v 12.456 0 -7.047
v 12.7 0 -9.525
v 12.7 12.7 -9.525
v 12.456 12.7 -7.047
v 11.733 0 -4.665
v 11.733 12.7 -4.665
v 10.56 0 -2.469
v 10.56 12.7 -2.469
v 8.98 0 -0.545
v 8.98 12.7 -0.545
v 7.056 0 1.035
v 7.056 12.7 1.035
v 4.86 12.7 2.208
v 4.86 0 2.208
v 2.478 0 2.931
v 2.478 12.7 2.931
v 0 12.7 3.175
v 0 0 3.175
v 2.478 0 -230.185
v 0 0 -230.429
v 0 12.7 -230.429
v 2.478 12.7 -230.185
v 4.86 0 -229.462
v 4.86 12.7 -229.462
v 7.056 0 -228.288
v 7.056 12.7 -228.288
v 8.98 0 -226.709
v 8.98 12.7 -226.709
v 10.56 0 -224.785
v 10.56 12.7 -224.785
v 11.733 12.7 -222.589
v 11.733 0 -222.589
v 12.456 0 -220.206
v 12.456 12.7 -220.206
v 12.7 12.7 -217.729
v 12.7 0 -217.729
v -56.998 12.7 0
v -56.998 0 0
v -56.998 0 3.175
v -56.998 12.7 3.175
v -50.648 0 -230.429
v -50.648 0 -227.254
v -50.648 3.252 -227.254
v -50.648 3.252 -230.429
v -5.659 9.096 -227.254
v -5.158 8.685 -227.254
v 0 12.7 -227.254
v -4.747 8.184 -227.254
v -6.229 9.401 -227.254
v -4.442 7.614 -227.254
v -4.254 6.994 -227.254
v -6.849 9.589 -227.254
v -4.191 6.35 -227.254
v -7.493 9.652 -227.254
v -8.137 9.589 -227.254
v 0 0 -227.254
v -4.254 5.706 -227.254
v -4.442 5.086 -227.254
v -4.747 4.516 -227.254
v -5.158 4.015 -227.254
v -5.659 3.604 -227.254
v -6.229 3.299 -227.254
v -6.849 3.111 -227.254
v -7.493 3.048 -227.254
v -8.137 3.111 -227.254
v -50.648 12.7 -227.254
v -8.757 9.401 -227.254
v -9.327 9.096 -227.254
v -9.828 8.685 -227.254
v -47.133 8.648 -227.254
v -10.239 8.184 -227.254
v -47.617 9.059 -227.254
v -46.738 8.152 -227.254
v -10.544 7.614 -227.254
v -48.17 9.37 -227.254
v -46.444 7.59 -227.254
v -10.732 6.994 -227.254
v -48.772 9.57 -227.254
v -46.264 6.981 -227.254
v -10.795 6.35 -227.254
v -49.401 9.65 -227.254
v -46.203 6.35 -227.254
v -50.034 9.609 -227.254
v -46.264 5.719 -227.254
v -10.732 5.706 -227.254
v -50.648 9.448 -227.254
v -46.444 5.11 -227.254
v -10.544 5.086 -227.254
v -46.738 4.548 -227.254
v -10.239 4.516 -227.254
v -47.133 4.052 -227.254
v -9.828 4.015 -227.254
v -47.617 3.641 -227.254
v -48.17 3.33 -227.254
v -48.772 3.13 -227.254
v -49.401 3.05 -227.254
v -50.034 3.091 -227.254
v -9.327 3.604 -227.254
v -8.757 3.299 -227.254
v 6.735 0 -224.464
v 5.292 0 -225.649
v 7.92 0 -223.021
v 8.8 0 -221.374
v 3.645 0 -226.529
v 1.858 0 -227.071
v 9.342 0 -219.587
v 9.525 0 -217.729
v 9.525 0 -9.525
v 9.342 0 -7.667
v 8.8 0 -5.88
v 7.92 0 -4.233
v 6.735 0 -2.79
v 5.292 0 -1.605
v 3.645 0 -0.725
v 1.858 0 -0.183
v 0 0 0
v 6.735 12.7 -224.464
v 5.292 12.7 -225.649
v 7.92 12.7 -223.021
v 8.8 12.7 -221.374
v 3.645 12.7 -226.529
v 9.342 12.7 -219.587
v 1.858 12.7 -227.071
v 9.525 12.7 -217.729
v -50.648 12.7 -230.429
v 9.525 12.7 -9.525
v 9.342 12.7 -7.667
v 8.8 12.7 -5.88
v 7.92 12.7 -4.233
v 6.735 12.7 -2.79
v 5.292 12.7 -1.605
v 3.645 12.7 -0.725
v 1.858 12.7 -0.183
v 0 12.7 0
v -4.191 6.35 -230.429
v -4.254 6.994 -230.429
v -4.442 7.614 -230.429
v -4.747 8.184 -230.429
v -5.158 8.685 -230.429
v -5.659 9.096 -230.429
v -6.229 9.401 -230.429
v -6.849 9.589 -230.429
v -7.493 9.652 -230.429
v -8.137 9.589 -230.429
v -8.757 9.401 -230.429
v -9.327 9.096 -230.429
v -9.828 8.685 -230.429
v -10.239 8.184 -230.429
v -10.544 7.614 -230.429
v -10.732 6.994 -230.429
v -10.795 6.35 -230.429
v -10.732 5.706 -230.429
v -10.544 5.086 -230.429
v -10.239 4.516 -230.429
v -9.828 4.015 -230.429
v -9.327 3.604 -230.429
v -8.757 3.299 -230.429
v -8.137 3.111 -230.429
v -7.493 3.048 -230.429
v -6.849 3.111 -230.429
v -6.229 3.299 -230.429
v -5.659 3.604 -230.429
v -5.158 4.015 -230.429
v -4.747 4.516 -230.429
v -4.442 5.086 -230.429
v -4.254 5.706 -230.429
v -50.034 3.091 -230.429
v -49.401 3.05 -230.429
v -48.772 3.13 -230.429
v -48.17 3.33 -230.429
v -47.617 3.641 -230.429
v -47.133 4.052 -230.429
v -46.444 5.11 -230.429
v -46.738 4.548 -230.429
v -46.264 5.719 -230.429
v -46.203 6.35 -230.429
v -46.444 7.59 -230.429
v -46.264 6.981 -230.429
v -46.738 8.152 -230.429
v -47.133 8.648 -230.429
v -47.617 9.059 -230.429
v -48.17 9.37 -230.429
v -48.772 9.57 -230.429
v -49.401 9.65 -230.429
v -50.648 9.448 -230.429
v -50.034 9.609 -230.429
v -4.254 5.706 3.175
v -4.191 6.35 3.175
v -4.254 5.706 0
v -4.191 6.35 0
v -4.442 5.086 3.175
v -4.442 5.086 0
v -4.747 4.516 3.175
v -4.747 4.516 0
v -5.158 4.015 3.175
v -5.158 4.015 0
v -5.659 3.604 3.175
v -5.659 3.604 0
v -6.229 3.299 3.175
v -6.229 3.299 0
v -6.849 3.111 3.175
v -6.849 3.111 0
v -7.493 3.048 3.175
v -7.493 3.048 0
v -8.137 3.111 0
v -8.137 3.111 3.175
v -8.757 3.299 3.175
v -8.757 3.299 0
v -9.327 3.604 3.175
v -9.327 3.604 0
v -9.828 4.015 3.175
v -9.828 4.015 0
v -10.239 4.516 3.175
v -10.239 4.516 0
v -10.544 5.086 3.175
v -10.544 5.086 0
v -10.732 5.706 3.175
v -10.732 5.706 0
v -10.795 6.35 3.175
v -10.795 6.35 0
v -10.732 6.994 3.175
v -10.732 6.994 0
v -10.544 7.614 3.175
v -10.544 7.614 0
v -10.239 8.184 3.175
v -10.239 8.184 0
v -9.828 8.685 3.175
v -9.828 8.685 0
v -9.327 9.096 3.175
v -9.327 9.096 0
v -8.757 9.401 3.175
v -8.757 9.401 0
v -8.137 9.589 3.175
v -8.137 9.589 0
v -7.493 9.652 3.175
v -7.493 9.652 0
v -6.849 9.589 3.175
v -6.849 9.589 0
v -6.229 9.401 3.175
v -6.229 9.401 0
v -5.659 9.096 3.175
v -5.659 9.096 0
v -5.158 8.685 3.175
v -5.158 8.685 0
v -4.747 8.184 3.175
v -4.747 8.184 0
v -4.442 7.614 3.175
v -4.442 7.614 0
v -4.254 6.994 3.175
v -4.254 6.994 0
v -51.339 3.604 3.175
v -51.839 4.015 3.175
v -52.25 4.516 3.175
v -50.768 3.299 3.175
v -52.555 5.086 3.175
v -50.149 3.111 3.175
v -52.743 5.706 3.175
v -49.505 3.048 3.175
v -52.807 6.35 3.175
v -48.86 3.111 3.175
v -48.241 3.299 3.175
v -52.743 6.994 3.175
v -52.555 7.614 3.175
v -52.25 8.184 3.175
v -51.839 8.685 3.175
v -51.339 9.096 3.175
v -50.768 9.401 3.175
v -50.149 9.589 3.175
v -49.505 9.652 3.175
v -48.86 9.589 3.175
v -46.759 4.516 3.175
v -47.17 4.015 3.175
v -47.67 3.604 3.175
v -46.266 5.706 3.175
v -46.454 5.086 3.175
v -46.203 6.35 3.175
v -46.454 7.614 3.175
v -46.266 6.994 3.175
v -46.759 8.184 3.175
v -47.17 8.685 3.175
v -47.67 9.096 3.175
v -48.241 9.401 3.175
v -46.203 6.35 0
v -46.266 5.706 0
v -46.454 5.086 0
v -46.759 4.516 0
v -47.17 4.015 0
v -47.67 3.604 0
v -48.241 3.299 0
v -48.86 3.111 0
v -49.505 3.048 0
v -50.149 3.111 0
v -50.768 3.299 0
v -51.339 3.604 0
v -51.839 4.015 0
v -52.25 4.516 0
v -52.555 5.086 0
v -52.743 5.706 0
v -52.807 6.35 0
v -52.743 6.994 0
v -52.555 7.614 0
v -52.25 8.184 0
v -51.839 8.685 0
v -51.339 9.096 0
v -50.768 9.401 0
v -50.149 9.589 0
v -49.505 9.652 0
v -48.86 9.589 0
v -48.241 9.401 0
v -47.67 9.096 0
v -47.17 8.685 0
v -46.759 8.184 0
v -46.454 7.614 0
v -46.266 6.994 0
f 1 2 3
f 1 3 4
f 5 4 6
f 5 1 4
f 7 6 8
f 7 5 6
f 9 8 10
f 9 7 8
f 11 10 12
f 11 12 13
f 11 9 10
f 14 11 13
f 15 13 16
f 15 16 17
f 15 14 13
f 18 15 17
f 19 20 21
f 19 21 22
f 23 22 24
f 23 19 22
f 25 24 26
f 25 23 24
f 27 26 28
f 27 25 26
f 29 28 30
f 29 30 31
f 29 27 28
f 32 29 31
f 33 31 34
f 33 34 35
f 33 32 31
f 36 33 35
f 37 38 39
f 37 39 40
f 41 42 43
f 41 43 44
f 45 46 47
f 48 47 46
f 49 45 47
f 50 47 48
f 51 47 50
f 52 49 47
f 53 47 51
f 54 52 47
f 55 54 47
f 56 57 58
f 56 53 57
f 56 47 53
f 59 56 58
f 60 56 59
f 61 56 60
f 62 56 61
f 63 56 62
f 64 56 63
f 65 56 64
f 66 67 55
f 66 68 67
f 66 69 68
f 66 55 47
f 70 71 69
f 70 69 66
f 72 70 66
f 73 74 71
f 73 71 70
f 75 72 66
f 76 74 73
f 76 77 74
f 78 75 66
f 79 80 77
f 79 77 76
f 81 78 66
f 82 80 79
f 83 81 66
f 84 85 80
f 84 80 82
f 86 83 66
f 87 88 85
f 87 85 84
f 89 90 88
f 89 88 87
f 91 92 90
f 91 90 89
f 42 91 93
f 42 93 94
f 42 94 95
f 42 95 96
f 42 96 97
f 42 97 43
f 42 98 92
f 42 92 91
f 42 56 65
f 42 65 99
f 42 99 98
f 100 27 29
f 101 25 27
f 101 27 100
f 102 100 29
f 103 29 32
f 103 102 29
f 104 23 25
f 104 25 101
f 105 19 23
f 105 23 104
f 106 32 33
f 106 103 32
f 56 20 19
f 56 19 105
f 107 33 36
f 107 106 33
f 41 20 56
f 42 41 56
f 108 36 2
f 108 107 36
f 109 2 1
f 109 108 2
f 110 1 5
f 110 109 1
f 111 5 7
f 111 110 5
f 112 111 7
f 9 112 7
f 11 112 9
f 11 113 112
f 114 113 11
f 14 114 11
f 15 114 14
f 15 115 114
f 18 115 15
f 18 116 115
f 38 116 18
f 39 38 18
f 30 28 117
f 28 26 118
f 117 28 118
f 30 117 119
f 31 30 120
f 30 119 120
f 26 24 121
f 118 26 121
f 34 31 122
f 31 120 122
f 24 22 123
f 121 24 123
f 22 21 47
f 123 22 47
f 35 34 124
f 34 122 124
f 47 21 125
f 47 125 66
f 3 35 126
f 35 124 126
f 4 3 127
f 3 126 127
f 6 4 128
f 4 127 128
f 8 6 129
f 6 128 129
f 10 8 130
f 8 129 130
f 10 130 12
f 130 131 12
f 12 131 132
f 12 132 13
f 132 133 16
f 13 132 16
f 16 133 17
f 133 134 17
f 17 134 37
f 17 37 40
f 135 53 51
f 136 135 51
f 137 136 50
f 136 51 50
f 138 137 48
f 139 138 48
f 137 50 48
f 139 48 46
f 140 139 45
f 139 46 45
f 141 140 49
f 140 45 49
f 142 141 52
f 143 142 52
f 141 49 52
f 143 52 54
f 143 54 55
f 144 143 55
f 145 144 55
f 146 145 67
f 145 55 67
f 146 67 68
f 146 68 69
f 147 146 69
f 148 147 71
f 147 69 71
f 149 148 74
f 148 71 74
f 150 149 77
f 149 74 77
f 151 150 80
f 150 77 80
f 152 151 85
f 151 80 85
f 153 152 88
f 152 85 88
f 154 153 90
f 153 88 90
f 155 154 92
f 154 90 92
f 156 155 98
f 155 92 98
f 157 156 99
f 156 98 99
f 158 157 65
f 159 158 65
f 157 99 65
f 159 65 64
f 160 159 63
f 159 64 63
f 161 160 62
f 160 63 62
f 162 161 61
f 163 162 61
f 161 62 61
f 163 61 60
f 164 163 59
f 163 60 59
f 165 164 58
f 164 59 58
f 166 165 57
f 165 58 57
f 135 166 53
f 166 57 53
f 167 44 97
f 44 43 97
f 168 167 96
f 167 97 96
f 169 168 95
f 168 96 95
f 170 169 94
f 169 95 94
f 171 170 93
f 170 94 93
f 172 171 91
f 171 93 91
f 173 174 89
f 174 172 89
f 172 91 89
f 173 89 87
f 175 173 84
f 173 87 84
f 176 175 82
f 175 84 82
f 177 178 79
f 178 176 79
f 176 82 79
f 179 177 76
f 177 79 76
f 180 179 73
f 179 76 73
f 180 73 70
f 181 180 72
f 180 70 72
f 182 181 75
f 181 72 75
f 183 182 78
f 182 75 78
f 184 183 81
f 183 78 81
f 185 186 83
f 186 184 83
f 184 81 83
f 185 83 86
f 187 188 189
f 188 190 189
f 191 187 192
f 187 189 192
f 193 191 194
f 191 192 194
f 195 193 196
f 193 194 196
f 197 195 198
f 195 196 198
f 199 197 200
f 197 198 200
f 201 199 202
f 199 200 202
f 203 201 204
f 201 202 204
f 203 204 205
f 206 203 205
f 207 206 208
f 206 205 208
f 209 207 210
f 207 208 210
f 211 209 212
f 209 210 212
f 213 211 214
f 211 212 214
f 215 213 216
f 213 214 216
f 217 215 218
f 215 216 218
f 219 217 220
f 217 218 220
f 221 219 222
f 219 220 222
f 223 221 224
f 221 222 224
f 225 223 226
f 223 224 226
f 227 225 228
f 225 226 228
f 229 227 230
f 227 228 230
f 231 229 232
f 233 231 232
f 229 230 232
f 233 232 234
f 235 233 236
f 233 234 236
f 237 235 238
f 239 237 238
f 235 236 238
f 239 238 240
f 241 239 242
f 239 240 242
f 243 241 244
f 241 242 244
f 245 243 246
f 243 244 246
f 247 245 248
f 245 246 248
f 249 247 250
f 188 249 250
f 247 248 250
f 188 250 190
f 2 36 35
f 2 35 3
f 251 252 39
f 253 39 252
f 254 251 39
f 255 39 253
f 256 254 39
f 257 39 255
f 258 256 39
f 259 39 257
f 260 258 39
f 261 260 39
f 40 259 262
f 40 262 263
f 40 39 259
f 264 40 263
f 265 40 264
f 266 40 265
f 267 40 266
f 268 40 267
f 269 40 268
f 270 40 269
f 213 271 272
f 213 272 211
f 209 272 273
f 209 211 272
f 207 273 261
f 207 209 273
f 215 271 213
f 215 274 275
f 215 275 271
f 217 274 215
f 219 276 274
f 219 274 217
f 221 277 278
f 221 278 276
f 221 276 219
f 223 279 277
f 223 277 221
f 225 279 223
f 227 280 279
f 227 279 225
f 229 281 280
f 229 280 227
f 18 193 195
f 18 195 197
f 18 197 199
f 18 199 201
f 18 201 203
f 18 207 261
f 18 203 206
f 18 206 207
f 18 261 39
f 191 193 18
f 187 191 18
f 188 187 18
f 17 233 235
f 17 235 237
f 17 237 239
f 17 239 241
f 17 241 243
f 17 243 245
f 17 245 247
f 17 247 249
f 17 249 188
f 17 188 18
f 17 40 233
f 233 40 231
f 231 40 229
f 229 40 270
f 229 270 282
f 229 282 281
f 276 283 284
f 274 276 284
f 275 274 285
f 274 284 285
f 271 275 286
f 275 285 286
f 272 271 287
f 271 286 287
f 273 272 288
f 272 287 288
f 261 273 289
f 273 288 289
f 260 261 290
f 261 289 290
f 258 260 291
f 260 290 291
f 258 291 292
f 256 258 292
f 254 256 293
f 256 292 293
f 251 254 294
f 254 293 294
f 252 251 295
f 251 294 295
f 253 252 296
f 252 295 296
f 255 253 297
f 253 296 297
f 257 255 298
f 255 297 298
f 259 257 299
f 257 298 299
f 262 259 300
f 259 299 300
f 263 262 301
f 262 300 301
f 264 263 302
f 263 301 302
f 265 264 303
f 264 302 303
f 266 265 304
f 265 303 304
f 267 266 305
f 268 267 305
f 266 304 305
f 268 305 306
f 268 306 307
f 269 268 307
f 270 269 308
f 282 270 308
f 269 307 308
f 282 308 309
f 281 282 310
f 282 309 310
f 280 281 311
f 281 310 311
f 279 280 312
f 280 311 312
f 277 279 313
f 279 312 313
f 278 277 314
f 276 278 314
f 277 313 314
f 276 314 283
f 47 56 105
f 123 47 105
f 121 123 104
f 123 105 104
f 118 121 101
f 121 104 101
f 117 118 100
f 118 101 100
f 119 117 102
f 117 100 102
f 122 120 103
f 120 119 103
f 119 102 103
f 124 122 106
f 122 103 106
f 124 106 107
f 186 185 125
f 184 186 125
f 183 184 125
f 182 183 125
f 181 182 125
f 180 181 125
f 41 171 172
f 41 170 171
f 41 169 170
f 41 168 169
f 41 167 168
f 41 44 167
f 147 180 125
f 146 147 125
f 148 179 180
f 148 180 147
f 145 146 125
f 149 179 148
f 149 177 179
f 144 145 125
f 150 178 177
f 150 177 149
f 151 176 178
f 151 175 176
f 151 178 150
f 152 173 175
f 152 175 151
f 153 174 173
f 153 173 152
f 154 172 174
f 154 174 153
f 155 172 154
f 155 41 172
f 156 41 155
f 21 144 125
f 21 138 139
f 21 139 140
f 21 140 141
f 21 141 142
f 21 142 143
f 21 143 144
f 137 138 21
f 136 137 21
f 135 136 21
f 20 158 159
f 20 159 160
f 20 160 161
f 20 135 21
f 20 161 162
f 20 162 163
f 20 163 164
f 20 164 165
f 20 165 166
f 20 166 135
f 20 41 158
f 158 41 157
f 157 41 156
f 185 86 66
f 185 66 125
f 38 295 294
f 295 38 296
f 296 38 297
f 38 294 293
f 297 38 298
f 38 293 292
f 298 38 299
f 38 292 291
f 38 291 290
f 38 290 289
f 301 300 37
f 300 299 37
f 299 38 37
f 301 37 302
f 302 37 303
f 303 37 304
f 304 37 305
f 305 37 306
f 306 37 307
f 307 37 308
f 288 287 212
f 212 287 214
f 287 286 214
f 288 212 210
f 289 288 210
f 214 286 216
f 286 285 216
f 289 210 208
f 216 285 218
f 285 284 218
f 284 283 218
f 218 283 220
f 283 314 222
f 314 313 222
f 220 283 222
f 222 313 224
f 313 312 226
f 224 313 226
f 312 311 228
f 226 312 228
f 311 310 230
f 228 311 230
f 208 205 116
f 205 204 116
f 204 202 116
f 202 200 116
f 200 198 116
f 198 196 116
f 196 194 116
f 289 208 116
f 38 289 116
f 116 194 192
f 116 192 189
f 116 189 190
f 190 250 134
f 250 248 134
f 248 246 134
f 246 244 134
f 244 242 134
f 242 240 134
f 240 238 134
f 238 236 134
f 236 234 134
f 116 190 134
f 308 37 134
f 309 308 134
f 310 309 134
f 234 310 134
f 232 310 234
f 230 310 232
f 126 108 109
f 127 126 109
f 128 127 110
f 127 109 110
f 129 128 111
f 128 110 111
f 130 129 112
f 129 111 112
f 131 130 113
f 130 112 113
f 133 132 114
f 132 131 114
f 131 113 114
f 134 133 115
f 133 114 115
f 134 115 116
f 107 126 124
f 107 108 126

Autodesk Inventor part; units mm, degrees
ref_plane "YZ Plane" through (0, 0, 0) normal (1, 0, 0) x (0, 1, 0)
ref_plane "XZ Plane" through (0, 0, 0) normal (0, 1, 0) x (-1, 0, 0)
ref_plane "XY Plane" through (0, 0, 0) normal (0, 0, 1) x (1, 0, 0)
sketch "Sketch1" plane through (0, 0, 0) normal (0, 0, 1) x (1, 0, 0)
  line L0 (0, 0) -> (-56.9976, 0)
  line L1 (-56.9976, 0) -> (-56.9976, 12.7)
  line L2 (-56.9976, 12.7) -> (0, 12.7)
  line L3 (0, 12.7) -> (0, 0)
  line L4 (0, 12.7) -> (-7.493, 12.7)
  line L5 (-7.493, 12.7) -> (-7.493, 6.35)
  line L6 (-56.9976, 12.7) -> (-49.5046, 12.7)
  line L7 (-49.5046, 12.7) -> (-49.5046, 6.35)
  circle A0 centre (-49.5046, 6.35) radius 3.302
  circle A1 centre (-7.493, 6.35) radius 3.302
  dimension "d1" = 56.9976
  dimension "d2" = 12.7
  dimension "d3" = 7.493
  dimension "d4" = 6.35
  dimension "d5" = 7.493
  dimension "d6" = 6.604
  dimension "d7" = 6.604
  dimension "d19" = 6.35
extrude "Plate1" add sketch "Sketch1" along normal blind 3.175
sketch "Sketch3" plane through (9.525, 0, -9.525) normal (1, 0, 0) x (0, 1, 0)
  line L0 (12.7, 0) -> (0, 0)
  line L1 (0, 0) -> (0, -208.2038)
  line L2 (0, -208.2038) -> (12.7, -208.2038)
  line L3 (12.7, -208.2038) -> (12.7, 0)
edge flange "Flange2" height 220.9038 angle 90 thickness 3.175 bend radius 9.525 thickness toward (1, 0, 0) relief tear relief width 3.175 relief depth 1.5875 edges at (0, 6.35, 0) wall of the first edge with corners at (9.525, 12.7, -9.525) (9.525, 0, -9.525) (9.525, 0, -217.7288) (9.525, 12.7, -217.7288)
bend "Bend2"
corner "Corner2"
sketch "Sketch4" plane through (0, 0, -227.2538) normal (0, 0, -1) x (-1, 0, 0)
  line L0 (0, 12.7) -> (0, 0)
  line L1 (0, 0) -> (50.6476, 0)
  line L2 (50.6476, 0) -> (50.6476, 12.7)
  line L3 (50.6476, 12.7) -> (0, 12.7)
edge flange "Flange3" height 63.3476 angle 90 thickness 3.175 bend radius 9.525 thickness toward (0, 0, -1) relief tear relief width 3.175 relief depth 1.5875 edges at (9.525, 6.35, -217.7288) wall of the first edge with corners at (0, 12.7, -227.2538) (0, 0, -227.2538) (-50.6476, 0, -227.2538) (-50.6476, 12.7, -227.2538)
bend "Bend3"
corner "Corner3"
sketch "Sketch5" plane through (0, 0, 3.175) normal (0, 0, 1) x (1, 0, 0)
  circle A0 centre (-7.493, 6.35) radius 3.302 projected
  circle A1 centre (-49.5046, 6.35) radius 3.302 projected
extrude "Extrusion1" cut sketch "Sketch5" against normal blind 2286
equation "\"d20\" = BendReliefWidth"
equation "\"d21\" = BendReliefDepth"
equation "\"d22\" = MinimumRemnant"
equation "\"d23\" = BendRadius"
equation "\"d27\" = CornerReliefSize"
equation "\"d28\" = GapSize"
equation "\"d29\" = JacobiRadiusSize"
equation "\"d30\" = BendReliefWidth"
equation "\"d31\" = BendReliefDepth"
equation "\"d32\" = MinimumRemnant"
equation "\"d33\" = BendRadius"
equation "\"d37\" = CornerReliefSize"
equation "\"d38\" = GapSize"
equation "\"d39\" = JacobiRadiusSize"
equation "\"BendRadius\" = Thickness"
equation "\"BendReliefWidth\" = Thickness"
equation "\"BendReliefDepth\" = 0.5 * Thickness"
equation "\"CornerReliefSize\" = 4 * Thickness"
equation "\"MinimumRemnant\" = 2 * Thickness"
equation "\"TransitionRadius\" = BendRadius"
equation "\"JacobiRadiusSize\" = BendRadius"
equation "\"GapSize\" = Thickness"
equation "\"d8\" = BendRadius"
equation "\"Thickness\" = 3.175"
properties part number "tie-together tier 1" material "Aluminum 6061"
